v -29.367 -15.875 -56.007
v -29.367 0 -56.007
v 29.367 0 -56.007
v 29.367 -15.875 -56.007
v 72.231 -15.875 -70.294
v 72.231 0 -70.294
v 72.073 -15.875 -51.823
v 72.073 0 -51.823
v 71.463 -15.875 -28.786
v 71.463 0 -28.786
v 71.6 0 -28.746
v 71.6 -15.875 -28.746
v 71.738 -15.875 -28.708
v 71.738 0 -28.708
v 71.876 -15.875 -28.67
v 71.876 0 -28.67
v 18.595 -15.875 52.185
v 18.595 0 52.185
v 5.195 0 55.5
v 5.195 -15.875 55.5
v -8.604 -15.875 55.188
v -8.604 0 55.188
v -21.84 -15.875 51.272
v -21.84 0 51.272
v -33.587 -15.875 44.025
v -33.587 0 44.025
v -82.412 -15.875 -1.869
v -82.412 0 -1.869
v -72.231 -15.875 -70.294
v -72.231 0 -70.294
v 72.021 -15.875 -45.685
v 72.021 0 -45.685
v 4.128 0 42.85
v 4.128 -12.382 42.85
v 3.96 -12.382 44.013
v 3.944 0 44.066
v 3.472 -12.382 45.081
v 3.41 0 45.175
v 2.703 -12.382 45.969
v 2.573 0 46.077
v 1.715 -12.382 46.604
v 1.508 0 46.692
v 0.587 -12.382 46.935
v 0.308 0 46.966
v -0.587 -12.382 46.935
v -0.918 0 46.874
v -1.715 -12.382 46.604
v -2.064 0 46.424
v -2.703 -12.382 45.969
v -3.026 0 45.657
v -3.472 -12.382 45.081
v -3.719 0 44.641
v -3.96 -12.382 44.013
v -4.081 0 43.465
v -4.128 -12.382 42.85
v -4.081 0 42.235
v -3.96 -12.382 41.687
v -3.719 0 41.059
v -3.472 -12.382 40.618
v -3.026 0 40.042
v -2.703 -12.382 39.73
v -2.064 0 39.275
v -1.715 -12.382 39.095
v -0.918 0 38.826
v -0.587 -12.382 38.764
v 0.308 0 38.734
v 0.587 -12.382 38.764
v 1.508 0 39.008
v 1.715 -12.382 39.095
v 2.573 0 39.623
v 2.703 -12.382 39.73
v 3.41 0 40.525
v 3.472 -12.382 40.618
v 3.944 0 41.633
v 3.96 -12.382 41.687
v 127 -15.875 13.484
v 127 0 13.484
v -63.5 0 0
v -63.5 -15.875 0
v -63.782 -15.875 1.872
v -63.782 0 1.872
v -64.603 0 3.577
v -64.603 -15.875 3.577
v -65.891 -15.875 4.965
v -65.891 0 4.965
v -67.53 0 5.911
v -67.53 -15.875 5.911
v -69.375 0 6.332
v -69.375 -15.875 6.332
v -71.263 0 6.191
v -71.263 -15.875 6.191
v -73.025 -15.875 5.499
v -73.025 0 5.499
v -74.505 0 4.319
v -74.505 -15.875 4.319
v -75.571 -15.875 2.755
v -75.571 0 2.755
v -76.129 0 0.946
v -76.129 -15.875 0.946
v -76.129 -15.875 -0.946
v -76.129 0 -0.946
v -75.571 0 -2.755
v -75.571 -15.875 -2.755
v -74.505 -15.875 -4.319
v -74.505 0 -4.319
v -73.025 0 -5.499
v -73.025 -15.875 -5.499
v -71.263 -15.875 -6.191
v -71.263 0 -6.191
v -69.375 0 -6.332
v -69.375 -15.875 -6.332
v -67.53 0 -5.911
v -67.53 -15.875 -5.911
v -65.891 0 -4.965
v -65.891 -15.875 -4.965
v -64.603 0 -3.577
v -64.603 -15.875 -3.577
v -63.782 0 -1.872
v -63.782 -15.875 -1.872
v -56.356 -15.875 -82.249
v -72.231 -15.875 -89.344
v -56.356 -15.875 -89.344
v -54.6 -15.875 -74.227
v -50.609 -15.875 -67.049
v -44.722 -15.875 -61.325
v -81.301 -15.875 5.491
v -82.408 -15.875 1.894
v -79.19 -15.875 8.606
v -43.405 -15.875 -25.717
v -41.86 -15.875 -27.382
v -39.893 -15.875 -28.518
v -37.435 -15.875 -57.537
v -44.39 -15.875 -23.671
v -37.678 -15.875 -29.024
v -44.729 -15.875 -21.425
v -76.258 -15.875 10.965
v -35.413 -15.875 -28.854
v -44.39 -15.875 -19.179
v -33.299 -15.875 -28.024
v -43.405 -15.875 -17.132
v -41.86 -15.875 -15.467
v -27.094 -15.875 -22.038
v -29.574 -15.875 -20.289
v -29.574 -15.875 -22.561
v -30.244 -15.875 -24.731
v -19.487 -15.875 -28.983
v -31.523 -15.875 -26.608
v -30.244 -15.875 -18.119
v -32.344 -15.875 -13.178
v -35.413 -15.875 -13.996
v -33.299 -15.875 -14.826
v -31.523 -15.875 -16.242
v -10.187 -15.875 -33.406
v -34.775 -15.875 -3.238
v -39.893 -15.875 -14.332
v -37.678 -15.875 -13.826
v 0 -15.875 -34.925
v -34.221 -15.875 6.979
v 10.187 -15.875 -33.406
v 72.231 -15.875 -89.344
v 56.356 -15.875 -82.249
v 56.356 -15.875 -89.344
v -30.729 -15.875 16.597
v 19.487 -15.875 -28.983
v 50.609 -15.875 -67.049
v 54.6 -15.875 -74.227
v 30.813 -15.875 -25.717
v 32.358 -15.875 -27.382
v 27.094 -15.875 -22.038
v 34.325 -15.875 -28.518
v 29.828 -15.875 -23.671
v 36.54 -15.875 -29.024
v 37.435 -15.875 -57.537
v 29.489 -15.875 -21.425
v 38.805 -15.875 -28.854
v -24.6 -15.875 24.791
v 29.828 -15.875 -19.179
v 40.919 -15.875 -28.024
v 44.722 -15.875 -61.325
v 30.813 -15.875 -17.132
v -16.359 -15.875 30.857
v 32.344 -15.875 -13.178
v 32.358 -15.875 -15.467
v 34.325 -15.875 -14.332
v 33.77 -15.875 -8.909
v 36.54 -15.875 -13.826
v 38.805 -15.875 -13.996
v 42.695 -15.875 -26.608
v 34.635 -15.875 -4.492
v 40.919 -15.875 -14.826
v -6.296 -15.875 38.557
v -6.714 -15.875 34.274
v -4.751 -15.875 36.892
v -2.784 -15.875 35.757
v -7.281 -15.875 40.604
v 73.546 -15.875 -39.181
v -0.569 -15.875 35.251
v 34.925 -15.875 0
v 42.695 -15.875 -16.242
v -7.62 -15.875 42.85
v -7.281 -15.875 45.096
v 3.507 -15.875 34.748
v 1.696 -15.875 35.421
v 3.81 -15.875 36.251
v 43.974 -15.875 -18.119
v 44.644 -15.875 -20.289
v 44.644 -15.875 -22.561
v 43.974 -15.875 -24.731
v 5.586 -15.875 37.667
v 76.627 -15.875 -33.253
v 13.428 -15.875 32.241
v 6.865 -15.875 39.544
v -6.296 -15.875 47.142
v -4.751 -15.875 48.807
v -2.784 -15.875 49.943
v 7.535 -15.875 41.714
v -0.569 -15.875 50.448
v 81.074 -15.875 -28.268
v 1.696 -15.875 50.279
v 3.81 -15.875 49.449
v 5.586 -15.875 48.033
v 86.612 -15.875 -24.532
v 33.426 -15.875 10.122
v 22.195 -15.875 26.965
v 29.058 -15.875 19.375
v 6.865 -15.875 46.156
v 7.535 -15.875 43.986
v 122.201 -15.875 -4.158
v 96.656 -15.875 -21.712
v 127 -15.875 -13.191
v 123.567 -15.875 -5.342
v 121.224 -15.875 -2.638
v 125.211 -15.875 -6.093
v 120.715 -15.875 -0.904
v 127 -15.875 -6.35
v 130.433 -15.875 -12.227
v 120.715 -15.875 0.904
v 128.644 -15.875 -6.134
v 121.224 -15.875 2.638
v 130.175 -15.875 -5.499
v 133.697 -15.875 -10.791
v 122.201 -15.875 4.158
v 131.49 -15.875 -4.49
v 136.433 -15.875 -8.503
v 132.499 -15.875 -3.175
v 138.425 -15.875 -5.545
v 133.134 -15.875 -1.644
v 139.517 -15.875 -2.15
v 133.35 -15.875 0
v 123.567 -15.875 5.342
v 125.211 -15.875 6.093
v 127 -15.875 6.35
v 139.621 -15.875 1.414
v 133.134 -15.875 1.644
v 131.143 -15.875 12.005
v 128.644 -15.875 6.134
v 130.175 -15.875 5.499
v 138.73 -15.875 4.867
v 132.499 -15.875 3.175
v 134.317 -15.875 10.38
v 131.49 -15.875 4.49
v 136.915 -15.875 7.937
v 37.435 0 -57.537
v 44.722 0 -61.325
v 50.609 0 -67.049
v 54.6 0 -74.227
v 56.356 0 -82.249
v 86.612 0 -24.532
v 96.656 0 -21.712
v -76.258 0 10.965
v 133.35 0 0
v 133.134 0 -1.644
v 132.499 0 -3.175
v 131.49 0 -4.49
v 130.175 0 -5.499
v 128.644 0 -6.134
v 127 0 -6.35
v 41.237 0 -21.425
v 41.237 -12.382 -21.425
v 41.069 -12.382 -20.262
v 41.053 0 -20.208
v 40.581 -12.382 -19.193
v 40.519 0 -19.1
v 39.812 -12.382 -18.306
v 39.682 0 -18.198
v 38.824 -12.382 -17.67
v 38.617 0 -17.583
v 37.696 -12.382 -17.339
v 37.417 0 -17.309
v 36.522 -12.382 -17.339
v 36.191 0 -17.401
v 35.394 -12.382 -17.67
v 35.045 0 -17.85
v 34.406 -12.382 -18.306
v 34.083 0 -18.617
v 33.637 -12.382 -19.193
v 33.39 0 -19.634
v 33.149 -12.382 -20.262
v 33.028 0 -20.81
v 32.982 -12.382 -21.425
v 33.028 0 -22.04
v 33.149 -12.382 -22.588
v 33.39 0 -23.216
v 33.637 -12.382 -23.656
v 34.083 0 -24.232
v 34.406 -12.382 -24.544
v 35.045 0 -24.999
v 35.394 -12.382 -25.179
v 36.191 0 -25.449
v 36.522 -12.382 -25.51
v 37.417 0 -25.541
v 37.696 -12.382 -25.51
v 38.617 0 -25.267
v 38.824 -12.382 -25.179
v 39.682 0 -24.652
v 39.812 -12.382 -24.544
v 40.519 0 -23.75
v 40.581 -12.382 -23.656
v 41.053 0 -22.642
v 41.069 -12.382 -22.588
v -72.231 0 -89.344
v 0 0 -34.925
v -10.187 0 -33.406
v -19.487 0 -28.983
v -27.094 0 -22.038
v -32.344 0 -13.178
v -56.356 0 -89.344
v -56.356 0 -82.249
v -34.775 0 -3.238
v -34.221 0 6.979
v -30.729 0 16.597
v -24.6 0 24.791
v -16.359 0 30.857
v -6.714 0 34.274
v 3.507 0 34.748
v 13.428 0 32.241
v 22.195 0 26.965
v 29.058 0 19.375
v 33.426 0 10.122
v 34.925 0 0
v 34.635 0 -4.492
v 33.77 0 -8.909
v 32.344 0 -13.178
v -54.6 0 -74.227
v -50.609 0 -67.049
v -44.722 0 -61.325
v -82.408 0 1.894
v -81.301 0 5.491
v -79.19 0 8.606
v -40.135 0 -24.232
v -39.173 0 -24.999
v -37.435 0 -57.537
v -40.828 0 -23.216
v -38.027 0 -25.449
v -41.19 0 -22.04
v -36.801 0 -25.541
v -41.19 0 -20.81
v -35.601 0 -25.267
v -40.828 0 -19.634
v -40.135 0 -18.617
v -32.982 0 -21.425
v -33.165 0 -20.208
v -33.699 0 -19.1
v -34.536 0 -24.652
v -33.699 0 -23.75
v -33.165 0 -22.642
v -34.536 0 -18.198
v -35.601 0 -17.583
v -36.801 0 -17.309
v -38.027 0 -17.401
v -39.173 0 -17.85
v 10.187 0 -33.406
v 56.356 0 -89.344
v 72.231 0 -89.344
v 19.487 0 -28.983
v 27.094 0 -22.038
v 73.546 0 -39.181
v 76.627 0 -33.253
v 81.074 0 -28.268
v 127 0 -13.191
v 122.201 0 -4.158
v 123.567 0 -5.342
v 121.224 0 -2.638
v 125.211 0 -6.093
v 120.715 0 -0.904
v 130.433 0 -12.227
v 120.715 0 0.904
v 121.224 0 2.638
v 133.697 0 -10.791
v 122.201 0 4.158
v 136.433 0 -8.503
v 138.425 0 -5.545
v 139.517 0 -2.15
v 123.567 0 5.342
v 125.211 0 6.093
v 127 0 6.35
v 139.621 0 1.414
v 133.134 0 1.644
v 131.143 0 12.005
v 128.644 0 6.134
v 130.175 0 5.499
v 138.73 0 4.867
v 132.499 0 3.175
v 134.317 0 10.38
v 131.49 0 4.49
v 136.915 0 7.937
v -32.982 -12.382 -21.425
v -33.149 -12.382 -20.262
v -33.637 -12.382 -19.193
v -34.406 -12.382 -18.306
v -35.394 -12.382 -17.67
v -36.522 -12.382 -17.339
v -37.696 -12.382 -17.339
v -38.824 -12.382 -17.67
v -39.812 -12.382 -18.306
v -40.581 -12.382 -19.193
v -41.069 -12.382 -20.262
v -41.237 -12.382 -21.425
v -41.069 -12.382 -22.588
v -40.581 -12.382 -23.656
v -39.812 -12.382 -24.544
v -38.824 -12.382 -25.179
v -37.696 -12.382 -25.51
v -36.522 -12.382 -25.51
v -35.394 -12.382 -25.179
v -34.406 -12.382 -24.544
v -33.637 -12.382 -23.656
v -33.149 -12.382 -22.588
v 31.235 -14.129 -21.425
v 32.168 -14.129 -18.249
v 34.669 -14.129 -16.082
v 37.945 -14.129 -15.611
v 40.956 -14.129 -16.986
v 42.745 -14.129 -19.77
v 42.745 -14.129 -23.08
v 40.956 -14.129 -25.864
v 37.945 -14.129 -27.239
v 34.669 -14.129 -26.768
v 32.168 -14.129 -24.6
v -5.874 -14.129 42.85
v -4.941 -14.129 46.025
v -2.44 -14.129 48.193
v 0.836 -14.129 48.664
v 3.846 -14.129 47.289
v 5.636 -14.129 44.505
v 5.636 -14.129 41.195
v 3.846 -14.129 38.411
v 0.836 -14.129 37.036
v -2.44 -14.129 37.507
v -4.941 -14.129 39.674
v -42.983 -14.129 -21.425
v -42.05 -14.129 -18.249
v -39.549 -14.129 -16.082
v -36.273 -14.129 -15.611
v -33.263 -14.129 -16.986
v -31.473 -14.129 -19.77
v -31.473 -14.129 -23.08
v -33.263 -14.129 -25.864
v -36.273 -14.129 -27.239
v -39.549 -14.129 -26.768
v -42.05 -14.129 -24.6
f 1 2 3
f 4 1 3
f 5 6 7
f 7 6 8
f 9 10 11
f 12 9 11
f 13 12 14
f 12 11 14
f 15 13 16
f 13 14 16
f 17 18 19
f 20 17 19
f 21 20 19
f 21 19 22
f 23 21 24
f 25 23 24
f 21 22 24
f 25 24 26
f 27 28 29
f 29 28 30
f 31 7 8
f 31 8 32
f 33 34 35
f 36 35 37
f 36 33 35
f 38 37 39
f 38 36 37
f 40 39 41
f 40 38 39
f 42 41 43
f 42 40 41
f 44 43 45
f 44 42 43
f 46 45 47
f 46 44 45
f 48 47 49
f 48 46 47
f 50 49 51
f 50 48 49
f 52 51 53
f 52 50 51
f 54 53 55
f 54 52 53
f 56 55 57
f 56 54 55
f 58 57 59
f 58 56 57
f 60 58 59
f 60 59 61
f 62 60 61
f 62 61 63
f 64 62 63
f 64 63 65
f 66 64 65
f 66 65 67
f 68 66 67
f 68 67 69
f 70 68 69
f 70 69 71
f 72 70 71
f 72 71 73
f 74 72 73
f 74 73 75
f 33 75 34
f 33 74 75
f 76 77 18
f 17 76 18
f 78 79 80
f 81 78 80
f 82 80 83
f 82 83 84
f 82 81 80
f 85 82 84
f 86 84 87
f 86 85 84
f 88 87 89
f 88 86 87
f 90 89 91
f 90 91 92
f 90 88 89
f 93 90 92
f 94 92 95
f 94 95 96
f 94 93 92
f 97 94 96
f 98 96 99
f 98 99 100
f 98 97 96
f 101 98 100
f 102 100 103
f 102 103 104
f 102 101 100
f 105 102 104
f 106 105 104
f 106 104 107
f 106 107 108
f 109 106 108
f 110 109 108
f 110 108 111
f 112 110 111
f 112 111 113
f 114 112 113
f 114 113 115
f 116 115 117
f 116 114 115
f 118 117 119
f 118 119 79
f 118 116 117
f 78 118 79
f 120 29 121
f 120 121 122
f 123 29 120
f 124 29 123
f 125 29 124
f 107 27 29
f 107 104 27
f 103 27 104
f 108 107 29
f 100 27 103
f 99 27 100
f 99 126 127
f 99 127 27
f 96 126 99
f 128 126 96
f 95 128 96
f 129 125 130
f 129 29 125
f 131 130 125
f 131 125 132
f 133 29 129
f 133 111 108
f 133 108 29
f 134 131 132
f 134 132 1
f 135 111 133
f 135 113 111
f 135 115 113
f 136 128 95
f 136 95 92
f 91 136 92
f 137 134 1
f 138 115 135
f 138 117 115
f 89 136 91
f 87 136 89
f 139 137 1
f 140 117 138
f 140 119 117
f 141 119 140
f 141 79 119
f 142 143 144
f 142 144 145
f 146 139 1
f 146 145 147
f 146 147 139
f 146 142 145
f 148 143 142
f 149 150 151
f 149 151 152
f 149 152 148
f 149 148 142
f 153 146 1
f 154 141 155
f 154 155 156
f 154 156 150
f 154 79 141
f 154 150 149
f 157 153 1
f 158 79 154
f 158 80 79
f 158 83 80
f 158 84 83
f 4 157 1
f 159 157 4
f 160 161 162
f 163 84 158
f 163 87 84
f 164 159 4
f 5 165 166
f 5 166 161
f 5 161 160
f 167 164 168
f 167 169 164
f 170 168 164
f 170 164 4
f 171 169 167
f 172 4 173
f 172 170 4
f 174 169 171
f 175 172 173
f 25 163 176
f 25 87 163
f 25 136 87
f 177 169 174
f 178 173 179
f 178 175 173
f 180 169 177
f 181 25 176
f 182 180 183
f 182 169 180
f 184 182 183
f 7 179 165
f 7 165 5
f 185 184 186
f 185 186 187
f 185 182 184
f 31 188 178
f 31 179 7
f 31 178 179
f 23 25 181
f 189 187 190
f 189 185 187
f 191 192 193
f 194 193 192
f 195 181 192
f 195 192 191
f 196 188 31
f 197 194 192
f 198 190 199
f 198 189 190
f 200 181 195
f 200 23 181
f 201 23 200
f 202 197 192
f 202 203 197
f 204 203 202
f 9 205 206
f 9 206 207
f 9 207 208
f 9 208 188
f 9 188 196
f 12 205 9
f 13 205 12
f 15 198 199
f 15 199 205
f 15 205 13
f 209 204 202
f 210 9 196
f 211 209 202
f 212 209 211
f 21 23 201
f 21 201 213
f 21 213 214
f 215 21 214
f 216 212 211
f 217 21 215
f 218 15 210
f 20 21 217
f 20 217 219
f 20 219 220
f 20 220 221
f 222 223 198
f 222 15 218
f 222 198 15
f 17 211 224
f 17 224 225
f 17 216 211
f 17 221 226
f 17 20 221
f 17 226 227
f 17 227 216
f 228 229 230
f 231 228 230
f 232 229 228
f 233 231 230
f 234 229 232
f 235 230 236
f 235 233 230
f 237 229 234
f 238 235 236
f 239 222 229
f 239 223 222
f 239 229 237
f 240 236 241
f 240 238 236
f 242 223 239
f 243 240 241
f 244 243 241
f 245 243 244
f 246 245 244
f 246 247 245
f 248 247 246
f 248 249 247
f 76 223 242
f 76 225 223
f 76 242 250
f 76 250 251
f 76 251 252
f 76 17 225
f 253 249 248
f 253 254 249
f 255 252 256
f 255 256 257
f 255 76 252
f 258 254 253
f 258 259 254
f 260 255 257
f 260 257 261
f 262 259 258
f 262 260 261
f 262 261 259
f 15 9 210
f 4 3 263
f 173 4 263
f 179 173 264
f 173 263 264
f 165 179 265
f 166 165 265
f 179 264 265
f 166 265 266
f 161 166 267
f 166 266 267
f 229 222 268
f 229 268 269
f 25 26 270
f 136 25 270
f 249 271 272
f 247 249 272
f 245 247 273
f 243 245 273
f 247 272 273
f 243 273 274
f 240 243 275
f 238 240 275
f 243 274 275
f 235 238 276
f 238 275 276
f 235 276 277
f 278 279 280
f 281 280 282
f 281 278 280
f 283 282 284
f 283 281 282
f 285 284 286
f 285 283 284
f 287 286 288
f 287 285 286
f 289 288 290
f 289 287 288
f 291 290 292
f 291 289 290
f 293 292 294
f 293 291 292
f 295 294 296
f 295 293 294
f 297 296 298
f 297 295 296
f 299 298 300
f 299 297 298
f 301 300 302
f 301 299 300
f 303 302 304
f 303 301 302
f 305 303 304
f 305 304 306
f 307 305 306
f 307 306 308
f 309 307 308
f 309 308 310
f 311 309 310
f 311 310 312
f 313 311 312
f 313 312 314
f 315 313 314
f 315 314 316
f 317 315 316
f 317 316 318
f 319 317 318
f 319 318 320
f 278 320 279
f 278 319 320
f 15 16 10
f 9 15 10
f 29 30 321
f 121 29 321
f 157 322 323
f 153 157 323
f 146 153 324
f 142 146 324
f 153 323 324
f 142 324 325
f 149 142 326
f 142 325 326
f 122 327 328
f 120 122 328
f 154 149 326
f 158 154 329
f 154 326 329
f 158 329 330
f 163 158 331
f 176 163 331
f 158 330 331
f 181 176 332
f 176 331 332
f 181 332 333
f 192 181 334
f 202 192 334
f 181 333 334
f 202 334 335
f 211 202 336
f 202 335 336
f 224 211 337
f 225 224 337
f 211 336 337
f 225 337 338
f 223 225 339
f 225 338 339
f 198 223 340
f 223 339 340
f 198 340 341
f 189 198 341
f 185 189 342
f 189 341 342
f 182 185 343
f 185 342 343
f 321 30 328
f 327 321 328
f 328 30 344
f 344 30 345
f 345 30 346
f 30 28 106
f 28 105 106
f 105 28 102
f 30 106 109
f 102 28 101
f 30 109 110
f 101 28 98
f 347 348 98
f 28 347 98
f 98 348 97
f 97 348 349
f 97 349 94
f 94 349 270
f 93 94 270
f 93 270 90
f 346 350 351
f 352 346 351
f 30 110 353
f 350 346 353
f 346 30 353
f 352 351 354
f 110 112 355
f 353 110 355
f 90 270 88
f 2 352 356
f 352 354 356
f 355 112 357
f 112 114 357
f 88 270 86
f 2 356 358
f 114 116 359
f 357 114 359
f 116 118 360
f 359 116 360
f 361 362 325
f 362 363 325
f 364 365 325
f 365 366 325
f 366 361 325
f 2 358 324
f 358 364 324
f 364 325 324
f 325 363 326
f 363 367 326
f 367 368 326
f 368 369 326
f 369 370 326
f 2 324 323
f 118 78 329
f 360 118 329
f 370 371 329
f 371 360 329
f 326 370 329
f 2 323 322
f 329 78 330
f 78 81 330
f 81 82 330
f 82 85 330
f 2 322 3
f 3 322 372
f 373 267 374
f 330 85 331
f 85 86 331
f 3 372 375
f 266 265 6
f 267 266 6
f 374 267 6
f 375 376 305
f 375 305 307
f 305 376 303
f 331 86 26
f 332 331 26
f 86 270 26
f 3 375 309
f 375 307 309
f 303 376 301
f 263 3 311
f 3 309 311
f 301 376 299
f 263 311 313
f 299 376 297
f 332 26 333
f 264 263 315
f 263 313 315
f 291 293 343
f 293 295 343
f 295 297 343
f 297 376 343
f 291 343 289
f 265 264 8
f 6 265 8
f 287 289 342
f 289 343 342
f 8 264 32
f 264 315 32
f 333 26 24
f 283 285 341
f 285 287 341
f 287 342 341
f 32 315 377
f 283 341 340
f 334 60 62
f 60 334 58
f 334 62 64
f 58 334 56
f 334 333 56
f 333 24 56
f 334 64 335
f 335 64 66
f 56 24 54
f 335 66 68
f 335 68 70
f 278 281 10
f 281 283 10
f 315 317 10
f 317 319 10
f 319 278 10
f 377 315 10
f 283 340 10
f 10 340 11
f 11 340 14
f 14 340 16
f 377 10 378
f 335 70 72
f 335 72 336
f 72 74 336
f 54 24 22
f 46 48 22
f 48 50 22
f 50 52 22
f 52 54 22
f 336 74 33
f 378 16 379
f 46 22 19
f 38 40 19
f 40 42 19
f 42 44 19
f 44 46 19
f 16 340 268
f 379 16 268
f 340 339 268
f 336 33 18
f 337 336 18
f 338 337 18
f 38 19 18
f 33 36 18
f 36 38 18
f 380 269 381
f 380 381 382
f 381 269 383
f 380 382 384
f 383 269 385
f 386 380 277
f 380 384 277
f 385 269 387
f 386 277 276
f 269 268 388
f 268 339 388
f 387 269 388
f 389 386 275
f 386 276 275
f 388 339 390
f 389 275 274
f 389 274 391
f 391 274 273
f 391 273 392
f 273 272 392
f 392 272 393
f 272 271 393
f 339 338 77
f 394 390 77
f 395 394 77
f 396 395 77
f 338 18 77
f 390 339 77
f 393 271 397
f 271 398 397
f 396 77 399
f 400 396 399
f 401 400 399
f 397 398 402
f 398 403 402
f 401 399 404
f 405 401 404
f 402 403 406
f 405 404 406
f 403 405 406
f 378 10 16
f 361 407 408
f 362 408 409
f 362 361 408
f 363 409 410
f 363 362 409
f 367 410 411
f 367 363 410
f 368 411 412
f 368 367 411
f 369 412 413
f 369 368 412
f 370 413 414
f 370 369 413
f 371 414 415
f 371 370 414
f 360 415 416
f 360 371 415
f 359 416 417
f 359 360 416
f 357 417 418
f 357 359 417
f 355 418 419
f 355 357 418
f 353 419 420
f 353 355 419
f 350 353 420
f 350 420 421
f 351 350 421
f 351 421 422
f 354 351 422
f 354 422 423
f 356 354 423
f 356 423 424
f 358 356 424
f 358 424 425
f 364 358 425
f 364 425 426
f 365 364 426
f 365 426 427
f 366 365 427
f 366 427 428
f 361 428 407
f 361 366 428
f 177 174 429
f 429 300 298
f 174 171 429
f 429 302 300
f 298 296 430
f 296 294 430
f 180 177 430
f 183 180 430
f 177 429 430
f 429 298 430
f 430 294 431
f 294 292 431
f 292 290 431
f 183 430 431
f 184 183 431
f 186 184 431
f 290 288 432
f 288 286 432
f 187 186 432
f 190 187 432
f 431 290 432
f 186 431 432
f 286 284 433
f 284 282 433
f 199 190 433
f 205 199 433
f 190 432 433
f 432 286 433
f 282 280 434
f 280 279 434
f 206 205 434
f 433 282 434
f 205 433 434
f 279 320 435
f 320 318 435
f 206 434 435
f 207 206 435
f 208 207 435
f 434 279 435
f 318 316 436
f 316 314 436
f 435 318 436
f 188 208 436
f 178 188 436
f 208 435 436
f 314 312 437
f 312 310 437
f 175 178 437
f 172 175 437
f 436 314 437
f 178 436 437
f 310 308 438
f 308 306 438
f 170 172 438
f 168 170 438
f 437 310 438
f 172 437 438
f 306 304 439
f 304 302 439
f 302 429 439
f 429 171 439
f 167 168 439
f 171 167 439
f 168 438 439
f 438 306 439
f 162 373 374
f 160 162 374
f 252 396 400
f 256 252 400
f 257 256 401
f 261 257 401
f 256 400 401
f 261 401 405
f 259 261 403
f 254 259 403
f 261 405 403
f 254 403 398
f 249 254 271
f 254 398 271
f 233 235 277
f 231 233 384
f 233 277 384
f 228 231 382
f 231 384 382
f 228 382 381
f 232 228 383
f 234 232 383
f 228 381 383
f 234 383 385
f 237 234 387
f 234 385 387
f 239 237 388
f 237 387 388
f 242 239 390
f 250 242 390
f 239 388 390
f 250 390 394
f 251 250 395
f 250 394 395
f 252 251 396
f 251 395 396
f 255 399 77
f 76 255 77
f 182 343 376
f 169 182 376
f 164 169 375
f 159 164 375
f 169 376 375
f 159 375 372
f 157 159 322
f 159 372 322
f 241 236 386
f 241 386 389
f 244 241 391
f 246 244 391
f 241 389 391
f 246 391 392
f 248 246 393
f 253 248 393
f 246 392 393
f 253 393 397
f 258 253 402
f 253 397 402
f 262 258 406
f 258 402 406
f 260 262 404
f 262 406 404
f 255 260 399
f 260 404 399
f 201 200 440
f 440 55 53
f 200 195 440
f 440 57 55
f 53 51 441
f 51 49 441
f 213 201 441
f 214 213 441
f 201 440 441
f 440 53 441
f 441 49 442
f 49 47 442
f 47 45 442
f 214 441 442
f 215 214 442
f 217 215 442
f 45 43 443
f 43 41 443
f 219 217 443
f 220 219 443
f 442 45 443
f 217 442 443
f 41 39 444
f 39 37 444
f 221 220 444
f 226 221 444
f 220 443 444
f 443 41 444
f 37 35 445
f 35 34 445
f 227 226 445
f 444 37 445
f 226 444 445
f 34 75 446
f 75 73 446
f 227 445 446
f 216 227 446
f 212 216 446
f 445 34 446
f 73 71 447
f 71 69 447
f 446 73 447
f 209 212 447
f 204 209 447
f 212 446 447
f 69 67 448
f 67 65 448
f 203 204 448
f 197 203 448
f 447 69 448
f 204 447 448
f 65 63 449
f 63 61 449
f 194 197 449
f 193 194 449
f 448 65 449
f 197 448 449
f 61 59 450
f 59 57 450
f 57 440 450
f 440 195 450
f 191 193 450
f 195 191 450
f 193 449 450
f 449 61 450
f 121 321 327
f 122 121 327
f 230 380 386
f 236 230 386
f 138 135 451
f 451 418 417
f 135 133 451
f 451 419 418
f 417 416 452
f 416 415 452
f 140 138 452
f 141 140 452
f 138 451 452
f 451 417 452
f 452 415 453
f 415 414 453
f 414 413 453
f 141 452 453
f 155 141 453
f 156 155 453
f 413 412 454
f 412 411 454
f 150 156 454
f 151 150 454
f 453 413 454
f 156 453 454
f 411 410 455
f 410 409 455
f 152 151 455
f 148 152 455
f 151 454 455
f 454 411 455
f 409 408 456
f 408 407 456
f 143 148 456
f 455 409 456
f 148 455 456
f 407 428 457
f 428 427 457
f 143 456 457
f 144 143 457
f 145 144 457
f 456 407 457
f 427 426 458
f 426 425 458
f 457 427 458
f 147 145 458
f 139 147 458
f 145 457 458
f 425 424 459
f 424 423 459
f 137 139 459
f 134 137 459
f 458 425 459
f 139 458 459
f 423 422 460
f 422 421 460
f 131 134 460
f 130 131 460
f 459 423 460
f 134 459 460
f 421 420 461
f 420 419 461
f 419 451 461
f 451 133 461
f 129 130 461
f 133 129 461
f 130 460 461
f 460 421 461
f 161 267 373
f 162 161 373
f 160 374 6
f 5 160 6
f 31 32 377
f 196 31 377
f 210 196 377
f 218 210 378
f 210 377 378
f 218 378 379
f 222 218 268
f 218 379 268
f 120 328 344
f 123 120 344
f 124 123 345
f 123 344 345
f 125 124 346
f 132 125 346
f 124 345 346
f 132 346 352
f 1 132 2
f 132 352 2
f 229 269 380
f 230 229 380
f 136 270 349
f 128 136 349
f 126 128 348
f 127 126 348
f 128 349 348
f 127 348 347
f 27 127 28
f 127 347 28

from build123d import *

# Parameters (mm, degrees)
F0_R           = 4.1275
F0_R_2         = 6.35
F1_DEPTH       = 15.875
F3_D           = 8.255
F3_CSINK_D     = 15.24
F3_CSINK_ANGLE = 90


with BuildPart() as f1:
    # F0 (on Front) → F1 (new body)
    with BuildSketch(Plane.XZ):
        with BuildLine():
            Line((-27.029276, -56.007), (0, -56.007))
            Line((0, -56.007), (27.029276, -56.007))
            ThreePointArc((27.029276, -56.007), (28.197928, -55.982797), (29.36658, -56.007))
            ThreePointArc((29.36658, -56.007), (47.874791, -63.97181), (56.35625, -82.249034))
            Line((56.35625, -82.249034), (56.35625, -89.3445))
            Line((56.35625, -89.3445), (72.23125, -89.3445))
            Line((72.23125, -89.3445), (72.23125, -70.2945))
            Line((72.23125, -70.2945), (72.073391, -51.823376))
            ThreePointArc((72.073391, -51.823376), (71.871442, -48.75548), (72.020927, -45.68458))
            ThreePointArc((72.020927, -45.68458), (76.627023, -33.253211), (86.611983, -24.532223))
            ThreePointArc((86.611983, -24.532223), (91.49573, -22.630497), (96.655561, -21.711968))
            Line((96.655561, -21.711968), (127, -13.191196))
            Line((127, -13.191196), (127, -6.35))
            ThreePointArc((127, -6.35), (120.65, 0), (127, 6.35))
            Line((127, 6.35), (127, 13.484294))
            Line((127, 13.484294), (18.594601, 52.185375))
            ThreePointArc((18.594601, 52.185375), (-8.60389, 55.18782), (-33.587092, 44.024833))
            Line((-33.587092, 44.024833), (-76.257501, 10.965124))
            ThreePointArc((-76.257501, 10.965124), (-81.301476, 5.491238), (-82.411728, -1.868957))
            Line((-82.411728, -1.868957), (-72.23125, -70.2945))
            Line((-72.23125, -70.2945), (-72.23125, -89.3445))
            Line((-72.23125, -89.3445), (-56.35625, -89.3445))
            Line((-56.35625, -89.3445), (-56.35625, -86.1695))
            ThreePointArc((-56.35625, -86.1695), (-56.424398, -84.209267), (-56.35625, -82.249034))
            ThreePointArc((-56.35625, -82.249034), (-47.874791, -63.97181), (-29.36658, -56.007))
            ThreePointArc((-29.36658, -56.007), (-28.197928, -55.982797), (-27.029276, -56.007))
        make_face()
        with Locations((-37.109015, -21.4249)):
            Circle(F0_R, mode=Mode.SUBTRACT)
        with Locations((37.109015, -21.4249)):
            Circle(F0_R, mode=Mode.SUBTRACT)
        with BuildLine():
            ThreePointArc((71.462556, -28.786209), (71.668645, -28.726833), (71.875518, -28.670248))
            Line((71.875518, -28.670248), (71.462556, -28.786209))
        make_face(mode=Mode.SUBTRACT)
        with Locations((-69.85, 0)):
            Circle(F0_R_2, mode=Mode.SUBTRACT)
        with BuildLine():
            ThreePointArc((0, -34.925), (-19.48747, -28.982653), (-32.343511, -13.177743))
            ThreePointArc((-32.343511, -13.177743), (-6.714108, 34.273552), (34.925, 0))
            ThreePointArc((34.925, 0), (34.273552, -6.714108), (32.343511, -13.177743))
            ThreePointArc((32.343511, -13.177743), (19.48747, -28.982653), (0, -34.925))
        make_face(mode=Mode.SUBTRACT)
        with Locations((0, 42.8498)):
            Circle(F0_R, mode=Mode.SUBTRACT)
        with BuildLine():
            Line((-29.36658, -56.007), (-27.029276, -56.007))
            ThreePointArc((-27.029276, -56.007), (-28.197928, -55.982797), (-29.36658, -56.007))
        make_face()
        with BuildLine():
            ThreePointArc((29.36658, -56.007), (28.197928, -55.982797), (27.029276, -56.007))
            Line((27.029276, -56.007), (29.36658, -56.007))
        make_face()
        with BuildLine():
            Line((-56.35625, -86.1695), (-56.35625, -82.249034))
            ThreePointArc((-56.35625, -82.249034), (-56.424398, -84.209267), (-56.35625, -86.1695))
        make_face()
        with BuildLine():
            ThreePointArc((72.020927, -45.68458), (71.871442, -48.75548), (72.073391, -51.823376))
            Line((72.073391, -51.823376), (72.020927, -45.68458))
        make_face()
        with BuildLine():
            ThreePointArc((96.655561, -21.711968), (91.49573, -22.630497), (86.611983, -24.532223))
            Line((86.611983, -24.532223), (96.655561, -21.711968))
        make_face()
        with BuildLine():
            Line((127, -6.35), (127, -13.191196))
            Line((127, -13.191196), (130.43339, -12.227094))
            ThreePointArc((130.43339, -12.227094), (139.694559, -0.371702), (131.142923, 12.005257))
            Line((131.142923, 12.005257), (127, 13.484294))
            Line((127, 13.484294), (127, 6.35))
            ThreePointArc((127, 6.35), (131.490128, 4.490128), (133.35, 0))
            ThreePointArc((133.35, 0), (131.490128, -4.490128), (127, -6.35))
        make_face()
    extrude(amount=F1_DEPTH)

    # F3 (through all)
    with Locations(Plane.XZ.offset(15.875)):
        with Locations((-37.109015, -21.4249), (0, 42.8498), (37.109015, -21.4249)):
            CounterSinkHole(F3_D / 2, F3_CSINK_D / 2, counter_sink_angle=F3_CSINK_ANGLE)


solid = f1.part
